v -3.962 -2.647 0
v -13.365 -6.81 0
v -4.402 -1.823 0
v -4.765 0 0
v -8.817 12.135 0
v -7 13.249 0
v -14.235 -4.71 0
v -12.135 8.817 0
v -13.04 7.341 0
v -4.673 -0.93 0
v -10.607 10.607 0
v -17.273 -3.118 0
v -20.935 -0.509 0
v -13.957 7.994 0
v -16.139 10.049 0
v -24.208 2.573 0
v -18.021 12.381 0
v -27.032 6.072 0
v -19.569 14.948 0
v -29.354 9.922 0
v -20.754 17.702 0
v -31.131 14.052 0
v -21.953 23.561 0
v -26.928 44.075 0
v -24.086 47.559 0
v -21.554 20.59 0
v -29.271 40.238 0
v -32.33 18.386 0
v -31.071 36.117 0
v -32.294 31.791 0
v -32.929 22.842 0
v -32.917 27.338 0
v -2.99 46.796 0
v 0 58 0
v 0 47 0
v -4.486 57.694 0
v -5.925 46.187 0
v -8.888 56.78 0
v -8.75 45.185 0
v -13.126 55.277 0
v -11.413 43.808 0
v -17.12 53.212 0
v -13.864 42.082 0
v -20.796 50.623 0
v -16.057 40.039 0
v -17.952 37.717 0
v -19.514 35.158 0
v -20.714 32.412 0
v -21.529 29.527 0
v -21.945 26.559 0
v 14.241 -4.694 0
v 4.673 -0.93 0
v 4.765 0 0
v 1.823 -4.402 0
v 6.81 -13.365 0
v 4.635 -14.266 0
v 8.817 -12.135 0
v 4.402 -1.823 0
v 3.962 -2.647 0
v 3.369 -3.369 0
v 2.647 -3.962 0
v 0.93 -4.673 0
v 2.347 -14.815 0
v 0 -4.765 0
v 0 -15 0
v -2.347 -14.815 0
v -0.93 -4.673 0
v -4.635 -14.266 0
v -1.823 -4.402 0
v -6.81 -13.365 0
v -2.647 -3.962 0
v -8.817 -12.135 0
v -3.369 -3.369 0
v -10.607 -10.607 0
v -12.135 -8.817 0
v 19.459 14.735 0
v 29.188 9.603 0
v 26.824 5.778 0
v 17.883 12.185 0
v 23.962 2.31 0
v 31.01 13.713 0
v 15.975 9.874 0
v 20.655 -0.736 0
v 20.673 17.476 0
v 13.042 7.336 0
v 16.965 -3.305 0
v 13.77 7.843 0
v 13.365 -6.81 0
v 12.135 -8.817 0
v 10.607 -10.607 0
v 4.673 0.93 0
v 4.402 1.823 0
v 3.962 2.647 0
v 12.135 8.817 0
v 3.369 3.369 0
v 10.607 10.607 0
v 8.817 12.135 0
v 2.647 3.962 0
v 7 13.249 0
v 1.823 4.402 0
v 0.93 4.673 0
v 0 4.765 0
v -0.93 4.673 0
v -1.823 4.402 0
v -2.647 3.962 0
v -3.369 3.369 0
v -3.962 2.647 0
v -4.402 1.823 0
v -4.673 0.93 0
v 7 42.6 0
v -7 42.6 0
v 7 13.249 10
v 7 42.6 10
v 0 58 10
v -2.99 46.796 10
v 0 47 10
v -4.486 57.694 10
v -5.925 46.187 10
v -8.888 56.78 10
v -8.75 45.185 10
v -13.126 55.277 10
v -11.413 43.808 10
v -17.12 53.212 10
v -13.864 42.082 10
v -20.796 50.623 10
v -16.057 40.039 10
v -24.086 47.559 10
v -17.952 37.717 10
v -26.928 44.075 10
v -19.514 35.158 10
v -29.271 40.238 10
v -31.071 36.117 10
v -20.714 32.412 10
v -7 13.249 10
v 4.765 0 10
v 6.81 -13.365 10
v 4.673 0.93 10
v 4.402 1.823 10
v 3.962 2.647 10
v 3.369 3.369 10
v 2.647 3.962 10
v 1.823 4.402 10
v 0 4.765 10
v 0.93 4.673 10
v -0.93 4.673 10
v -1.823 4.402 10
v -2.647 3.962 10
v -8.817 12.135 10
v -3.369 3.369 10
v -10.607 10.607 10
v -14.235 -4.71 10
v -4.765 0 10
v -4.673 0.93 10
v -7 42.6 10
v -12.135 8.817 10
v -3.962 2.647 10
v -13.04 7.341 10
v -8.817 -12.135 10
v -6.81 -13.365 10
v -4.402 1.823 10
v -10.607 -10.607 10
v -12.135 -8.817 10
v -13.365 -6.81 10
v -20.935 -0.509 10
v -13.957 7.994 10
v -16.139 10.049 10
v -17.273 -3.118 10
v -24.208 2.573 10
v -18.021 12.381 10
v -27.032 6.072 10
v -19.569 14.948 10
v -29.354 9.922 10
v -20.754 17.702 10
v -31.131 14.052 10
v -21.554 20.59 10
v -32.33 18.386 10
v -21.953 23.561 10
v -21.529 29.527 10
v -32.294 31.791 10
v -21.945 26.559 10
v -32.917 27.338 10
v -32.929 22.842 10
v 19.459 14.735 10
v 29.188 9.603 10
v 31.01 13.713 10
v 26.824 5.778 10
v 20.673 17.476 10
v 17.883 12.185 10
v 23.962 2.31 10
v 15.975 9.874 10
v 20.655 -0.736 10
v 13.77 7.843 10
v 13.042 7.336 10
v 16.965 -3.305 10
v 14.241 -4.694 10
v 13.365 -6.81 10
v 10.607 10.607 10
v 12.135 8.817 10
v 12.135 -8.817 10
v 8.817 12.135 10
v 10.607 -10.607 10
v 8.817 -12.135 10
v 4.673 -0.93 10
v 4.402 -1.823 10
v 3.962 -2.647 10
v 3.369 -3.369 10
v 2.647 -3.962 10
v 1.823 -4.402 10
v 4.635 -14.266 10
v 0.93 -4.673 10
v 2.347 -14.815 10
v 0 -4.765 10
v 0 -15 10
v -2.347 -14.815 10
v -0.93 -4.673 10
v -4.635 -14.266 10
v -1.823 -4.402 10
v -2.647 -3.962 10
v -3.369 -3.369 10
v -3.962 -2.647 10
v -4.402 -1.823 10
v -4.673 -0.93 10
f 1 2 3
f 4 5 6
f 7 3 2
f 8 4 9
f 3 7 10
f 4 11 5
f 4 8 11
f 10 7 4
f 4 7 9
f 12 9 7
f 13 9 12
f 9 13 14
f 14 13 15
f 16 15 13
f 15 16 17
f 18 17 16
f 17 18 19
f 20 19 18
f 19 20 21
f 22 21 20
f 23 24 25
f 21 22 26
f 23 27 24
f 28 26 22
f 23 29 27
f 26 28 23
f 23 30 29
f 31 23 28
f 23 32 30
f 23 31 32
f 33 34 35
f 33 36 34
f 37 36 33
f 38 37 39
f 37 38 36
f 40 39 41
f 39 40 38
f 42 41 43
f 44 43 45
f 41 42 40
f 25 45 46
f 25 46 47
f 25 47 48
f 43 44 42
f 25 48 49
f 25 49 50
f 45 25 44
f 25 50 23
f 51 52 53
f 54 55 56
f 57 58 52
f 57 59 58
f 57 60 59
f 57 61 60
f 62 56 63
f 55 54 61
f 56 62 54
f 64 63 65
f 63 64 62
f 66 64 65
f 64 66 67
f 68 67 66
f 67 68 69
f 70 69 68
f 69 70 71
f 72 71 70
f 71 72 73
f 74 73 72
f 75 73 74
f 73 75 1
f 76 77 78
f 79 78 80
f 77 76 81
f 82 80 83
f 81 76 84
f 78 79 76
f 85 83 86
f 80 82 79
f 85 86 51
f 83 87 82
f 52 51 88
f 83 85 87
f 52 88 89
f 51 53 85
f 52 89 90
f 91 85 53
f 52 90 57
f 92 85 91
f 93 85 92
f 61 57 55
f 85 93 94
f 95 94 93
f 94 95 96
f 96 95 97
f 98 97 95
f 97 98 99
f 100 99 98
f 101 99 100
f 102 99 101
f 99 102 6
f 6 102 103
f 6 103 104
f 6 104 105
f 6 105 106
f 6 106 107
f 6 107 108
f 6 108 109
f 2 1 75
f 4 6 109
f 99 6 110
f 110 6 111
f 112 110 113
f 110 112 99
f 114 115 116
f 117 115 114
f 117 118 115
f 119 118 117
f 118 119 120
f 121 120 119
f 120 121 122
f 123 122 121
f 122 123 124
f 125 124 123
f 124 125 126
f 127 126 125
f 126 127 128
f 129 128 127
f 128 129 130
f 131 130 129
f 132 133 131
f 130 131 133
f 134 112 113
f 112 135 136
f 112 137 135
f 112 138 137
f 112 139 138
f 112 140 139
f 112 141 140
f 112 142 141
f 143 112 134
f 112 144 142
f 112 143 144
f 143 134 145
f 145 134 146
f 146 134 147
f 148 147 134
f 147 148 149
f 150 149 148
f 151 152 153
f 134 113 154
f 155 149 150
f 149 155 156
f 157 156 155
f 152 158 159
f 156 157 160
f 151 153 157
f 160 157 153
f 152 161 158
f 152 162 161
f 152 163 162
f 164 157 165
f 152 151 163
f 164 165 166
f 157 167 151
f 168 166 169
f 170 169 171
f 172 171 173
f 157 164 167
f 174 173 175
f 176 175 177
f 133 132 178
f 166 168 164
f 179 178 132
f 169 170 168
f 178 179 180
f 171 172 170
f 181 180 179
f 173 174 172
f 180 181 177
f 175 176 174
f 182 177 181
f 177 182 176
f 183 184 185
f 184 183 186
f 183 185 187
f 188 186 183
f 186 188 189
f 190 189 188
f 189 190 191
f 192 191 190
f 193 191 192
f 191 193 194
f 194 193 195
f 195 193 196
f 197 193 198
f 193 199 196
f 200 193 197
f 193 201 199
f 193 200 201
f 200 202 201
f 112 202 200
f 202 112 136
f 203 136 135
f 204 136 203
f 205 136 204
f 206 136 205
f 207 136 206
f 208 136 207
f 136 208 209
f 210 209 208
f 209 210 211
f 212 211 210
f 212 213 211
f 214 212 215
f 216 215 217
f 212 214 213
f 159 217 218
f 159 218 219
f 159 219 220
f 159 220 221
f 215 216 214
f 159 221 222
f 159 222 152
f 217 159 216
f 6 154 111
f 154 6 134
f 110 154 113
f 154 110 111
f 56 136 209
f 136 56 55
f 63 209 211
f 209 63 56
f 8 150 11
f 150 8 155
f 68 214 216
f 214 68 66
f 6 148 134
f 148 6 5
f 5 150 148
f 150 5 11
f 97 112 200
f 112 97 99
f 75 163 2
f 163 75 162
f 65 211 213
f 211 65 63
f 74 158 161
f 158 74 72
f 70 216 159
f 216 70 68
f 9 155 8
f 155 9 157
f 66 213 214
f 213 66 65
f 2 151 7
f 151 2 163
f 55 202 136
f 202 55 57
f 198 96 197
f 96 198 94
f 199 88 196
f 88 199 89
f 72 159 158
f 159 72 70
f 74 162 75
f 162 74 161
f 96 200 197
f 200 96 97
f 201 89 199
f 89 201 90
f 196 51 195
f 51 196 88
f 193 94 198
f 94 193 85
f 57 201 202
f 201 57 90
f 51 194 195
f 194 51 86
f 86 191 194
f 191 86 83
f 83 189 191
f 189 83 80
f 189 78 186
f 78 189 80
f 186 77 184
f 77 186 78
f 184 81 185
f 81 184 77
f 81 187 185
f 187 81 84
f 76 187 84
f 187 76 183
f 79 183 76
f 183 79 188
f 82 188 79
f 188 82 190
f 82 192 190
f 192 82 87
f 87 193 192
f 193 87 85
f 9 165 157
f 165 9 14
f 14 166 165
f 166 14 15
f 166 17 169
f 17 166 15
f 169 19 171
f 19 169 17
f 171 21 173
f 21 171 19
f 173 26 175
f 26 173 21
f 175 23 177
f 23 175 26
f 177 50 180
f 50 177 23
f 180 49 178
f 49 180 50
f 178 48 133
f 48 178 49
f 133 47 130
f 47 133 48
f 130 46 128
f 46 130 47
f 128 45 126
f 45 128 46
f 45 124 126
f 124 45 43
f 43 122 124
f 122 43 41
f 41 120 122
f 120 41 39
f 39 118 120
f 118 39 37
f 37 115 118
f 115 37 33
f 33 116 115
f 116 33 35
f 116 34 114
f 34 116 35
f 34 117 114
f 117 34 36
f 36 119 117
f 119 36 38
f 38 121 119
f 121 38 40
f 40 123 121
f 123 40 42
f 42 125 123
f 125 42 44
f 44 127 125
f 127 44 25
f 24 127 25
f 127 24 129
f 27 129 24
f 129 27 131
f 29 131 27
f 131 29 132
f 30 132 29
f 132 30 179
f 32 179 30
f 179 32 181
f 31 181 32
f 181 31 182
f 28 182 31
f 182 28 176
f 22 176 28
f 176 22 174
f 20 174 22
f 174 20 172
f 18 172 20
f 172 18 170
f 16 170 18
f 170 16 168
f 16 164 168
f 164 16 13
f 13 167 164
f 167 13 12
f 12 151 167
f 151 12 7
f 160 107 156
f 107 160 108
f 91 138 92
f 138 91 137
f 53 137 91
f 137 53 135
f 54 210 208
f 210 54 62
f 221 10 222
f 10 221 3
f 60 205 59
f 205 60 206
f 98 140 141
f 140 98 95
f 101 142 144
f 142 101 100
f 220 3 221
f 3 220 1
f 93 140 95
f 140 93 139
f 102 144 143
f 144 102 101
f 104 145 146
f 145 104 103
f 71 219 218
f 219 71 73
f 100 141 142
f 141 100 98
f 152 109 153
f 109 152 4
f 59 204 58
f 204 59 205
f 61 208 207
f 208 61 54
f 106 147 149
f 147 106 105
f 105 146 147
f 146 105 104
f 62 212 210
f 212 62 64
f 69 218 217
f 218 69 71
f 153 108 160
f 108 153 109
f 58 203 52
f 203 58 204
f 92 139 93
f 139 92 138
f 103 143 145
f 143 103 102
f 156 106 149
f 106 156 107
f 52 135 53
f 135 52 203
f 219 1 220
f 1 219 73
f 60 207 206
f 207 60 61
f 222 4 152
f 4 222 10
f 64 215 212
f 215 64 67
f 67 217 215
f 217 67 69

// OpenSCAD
$fn = 32;

// ----------------------------------------------------------------------
// Hook: 50 mm shank into a 22 mm curl, 10 mm thick
// ----------------------------------------------------------------------

// --- parameters (mm) ---
shank_len = 50;           // shank length from the boss centre
shank_w = 14;             // shank width
boss_d = 30;              // boss diameter
bore_d = 9.53;            // boss bore
curl_in = 22;             // curl inner radius
curl_out = 33;            // curl outer radius
curl_sweep = 250;         // curl sweep angle
hook_t = 10;              // hook thickness

shank_profile = [[-7, 42.6], [7, 42.6], [7, 13], [-7, 13]];
boss_profile = [[15, 0], [14.815, 2.347], [14.266, 4.635], [13.365, 6.81], [12.135, 8.817], [10.607, 10.607], [8.817, 12.135], [6.81, 13.365], [4.635, 14.266], [2.347, 14.815], [0, 15], [-2.347, 14.815], [-4.635, 14.266], [-6.81, 13.365], [-8.817, 12.135], [-10.607, 10.607], [-12.135, 8.817], [-13.365, 6.81], [-14.266, 4.635], [-14.815, 2.347], [-15, 0], [-14.815, -2.347], [-14.266, -4.635], [-13.365, -6.81], [-12.135, -8.817], [-10.607, -10.607], [-8.817, -12.135], [-6.81, -13.365], [-4.635, -14.266], [-2.347, -14.815], [0, -15], [2.347, -14.815], [4.635, -14.266], [6.81, -13.365], [8.817, -12.135], [10.607, -10.607], [12.135, -8.817], [13.365, -6.81], [14.266, -4.635], [14.815, -2.347]];
curl_profile = [[0, 58], [-4.486, 57.694], [-8.888, 56.78], [-13.126, 55.277], [-17.12, 53.212], [-20.796, 50.623], [-24.086, 47.559], [-26.928, 44.075], [-29.271, 40.238], [-31.071, 36.117], [-32.294, 31.791], [-32.917, 27.338], [-32.929, 22.842], [-32.33, 18.386], [-31.131, 14.052], [-29.354, 9.922], [-27.032, 6.072], [-24.208, 2.573], [-20.935, -0.509], [-17.273, -3.118], [-13.291, -5.205], [-9.061, -6.732], [-4.664, -7.669], [-0.18, -8], [4.307, -7.718], [8.715, -6.828], [12.96, -5.348], [16.965, -3.305], [20.655, -0.736], [23.962, 2.31], [26.824, 5.778], [29.188, 9.603], [31.01, 13.713], [20.673, 17.476], [19.459, 14.735], [17.883, 12.185], [15.975, 9.874], [13.77, 7.843], [11.31, 6.13], [8.64, 4.768], [5.81, 3.781], [2.872, 3.188], [-0.12, 3], [-3.109, 3.221], [-6.041, 3.846], [-8.86, 4.863], [-11.515, 6.254], [-13.957, 7.994], [-16.139, 10.049], [-18.021, 12.381], [-19.569, 14.948], [-20.754, 17.702], [-21.554, 20.59], [-21.953, 23.561], [-21.945, 26.559], [-21.529, 29.527], [-20.714, 32.412], [-19.514, 35.158], [-17.952, 37.717], [-16.057, 40.039], [-13.864, 42.082], [-11.413, 43.808], [-8.75, 45.185], [-5.925, 46.187], [-2.99, 46.796], [0, 47]];

difference() {
  union() {
    /* three overlapping outlines: shank, boss and the smooth curl */
    linear_extrude(height = hook_t) polygon(shank_profile);
    linear_extrude(height = hook_t) polygon(boss_profile);
    linear_extrude(height = hook_t) polygon(curl_profile);
  }
  translate([0, 0, -2.5]) cylinder(h = hook_t + 5, d = bore_d);
}
